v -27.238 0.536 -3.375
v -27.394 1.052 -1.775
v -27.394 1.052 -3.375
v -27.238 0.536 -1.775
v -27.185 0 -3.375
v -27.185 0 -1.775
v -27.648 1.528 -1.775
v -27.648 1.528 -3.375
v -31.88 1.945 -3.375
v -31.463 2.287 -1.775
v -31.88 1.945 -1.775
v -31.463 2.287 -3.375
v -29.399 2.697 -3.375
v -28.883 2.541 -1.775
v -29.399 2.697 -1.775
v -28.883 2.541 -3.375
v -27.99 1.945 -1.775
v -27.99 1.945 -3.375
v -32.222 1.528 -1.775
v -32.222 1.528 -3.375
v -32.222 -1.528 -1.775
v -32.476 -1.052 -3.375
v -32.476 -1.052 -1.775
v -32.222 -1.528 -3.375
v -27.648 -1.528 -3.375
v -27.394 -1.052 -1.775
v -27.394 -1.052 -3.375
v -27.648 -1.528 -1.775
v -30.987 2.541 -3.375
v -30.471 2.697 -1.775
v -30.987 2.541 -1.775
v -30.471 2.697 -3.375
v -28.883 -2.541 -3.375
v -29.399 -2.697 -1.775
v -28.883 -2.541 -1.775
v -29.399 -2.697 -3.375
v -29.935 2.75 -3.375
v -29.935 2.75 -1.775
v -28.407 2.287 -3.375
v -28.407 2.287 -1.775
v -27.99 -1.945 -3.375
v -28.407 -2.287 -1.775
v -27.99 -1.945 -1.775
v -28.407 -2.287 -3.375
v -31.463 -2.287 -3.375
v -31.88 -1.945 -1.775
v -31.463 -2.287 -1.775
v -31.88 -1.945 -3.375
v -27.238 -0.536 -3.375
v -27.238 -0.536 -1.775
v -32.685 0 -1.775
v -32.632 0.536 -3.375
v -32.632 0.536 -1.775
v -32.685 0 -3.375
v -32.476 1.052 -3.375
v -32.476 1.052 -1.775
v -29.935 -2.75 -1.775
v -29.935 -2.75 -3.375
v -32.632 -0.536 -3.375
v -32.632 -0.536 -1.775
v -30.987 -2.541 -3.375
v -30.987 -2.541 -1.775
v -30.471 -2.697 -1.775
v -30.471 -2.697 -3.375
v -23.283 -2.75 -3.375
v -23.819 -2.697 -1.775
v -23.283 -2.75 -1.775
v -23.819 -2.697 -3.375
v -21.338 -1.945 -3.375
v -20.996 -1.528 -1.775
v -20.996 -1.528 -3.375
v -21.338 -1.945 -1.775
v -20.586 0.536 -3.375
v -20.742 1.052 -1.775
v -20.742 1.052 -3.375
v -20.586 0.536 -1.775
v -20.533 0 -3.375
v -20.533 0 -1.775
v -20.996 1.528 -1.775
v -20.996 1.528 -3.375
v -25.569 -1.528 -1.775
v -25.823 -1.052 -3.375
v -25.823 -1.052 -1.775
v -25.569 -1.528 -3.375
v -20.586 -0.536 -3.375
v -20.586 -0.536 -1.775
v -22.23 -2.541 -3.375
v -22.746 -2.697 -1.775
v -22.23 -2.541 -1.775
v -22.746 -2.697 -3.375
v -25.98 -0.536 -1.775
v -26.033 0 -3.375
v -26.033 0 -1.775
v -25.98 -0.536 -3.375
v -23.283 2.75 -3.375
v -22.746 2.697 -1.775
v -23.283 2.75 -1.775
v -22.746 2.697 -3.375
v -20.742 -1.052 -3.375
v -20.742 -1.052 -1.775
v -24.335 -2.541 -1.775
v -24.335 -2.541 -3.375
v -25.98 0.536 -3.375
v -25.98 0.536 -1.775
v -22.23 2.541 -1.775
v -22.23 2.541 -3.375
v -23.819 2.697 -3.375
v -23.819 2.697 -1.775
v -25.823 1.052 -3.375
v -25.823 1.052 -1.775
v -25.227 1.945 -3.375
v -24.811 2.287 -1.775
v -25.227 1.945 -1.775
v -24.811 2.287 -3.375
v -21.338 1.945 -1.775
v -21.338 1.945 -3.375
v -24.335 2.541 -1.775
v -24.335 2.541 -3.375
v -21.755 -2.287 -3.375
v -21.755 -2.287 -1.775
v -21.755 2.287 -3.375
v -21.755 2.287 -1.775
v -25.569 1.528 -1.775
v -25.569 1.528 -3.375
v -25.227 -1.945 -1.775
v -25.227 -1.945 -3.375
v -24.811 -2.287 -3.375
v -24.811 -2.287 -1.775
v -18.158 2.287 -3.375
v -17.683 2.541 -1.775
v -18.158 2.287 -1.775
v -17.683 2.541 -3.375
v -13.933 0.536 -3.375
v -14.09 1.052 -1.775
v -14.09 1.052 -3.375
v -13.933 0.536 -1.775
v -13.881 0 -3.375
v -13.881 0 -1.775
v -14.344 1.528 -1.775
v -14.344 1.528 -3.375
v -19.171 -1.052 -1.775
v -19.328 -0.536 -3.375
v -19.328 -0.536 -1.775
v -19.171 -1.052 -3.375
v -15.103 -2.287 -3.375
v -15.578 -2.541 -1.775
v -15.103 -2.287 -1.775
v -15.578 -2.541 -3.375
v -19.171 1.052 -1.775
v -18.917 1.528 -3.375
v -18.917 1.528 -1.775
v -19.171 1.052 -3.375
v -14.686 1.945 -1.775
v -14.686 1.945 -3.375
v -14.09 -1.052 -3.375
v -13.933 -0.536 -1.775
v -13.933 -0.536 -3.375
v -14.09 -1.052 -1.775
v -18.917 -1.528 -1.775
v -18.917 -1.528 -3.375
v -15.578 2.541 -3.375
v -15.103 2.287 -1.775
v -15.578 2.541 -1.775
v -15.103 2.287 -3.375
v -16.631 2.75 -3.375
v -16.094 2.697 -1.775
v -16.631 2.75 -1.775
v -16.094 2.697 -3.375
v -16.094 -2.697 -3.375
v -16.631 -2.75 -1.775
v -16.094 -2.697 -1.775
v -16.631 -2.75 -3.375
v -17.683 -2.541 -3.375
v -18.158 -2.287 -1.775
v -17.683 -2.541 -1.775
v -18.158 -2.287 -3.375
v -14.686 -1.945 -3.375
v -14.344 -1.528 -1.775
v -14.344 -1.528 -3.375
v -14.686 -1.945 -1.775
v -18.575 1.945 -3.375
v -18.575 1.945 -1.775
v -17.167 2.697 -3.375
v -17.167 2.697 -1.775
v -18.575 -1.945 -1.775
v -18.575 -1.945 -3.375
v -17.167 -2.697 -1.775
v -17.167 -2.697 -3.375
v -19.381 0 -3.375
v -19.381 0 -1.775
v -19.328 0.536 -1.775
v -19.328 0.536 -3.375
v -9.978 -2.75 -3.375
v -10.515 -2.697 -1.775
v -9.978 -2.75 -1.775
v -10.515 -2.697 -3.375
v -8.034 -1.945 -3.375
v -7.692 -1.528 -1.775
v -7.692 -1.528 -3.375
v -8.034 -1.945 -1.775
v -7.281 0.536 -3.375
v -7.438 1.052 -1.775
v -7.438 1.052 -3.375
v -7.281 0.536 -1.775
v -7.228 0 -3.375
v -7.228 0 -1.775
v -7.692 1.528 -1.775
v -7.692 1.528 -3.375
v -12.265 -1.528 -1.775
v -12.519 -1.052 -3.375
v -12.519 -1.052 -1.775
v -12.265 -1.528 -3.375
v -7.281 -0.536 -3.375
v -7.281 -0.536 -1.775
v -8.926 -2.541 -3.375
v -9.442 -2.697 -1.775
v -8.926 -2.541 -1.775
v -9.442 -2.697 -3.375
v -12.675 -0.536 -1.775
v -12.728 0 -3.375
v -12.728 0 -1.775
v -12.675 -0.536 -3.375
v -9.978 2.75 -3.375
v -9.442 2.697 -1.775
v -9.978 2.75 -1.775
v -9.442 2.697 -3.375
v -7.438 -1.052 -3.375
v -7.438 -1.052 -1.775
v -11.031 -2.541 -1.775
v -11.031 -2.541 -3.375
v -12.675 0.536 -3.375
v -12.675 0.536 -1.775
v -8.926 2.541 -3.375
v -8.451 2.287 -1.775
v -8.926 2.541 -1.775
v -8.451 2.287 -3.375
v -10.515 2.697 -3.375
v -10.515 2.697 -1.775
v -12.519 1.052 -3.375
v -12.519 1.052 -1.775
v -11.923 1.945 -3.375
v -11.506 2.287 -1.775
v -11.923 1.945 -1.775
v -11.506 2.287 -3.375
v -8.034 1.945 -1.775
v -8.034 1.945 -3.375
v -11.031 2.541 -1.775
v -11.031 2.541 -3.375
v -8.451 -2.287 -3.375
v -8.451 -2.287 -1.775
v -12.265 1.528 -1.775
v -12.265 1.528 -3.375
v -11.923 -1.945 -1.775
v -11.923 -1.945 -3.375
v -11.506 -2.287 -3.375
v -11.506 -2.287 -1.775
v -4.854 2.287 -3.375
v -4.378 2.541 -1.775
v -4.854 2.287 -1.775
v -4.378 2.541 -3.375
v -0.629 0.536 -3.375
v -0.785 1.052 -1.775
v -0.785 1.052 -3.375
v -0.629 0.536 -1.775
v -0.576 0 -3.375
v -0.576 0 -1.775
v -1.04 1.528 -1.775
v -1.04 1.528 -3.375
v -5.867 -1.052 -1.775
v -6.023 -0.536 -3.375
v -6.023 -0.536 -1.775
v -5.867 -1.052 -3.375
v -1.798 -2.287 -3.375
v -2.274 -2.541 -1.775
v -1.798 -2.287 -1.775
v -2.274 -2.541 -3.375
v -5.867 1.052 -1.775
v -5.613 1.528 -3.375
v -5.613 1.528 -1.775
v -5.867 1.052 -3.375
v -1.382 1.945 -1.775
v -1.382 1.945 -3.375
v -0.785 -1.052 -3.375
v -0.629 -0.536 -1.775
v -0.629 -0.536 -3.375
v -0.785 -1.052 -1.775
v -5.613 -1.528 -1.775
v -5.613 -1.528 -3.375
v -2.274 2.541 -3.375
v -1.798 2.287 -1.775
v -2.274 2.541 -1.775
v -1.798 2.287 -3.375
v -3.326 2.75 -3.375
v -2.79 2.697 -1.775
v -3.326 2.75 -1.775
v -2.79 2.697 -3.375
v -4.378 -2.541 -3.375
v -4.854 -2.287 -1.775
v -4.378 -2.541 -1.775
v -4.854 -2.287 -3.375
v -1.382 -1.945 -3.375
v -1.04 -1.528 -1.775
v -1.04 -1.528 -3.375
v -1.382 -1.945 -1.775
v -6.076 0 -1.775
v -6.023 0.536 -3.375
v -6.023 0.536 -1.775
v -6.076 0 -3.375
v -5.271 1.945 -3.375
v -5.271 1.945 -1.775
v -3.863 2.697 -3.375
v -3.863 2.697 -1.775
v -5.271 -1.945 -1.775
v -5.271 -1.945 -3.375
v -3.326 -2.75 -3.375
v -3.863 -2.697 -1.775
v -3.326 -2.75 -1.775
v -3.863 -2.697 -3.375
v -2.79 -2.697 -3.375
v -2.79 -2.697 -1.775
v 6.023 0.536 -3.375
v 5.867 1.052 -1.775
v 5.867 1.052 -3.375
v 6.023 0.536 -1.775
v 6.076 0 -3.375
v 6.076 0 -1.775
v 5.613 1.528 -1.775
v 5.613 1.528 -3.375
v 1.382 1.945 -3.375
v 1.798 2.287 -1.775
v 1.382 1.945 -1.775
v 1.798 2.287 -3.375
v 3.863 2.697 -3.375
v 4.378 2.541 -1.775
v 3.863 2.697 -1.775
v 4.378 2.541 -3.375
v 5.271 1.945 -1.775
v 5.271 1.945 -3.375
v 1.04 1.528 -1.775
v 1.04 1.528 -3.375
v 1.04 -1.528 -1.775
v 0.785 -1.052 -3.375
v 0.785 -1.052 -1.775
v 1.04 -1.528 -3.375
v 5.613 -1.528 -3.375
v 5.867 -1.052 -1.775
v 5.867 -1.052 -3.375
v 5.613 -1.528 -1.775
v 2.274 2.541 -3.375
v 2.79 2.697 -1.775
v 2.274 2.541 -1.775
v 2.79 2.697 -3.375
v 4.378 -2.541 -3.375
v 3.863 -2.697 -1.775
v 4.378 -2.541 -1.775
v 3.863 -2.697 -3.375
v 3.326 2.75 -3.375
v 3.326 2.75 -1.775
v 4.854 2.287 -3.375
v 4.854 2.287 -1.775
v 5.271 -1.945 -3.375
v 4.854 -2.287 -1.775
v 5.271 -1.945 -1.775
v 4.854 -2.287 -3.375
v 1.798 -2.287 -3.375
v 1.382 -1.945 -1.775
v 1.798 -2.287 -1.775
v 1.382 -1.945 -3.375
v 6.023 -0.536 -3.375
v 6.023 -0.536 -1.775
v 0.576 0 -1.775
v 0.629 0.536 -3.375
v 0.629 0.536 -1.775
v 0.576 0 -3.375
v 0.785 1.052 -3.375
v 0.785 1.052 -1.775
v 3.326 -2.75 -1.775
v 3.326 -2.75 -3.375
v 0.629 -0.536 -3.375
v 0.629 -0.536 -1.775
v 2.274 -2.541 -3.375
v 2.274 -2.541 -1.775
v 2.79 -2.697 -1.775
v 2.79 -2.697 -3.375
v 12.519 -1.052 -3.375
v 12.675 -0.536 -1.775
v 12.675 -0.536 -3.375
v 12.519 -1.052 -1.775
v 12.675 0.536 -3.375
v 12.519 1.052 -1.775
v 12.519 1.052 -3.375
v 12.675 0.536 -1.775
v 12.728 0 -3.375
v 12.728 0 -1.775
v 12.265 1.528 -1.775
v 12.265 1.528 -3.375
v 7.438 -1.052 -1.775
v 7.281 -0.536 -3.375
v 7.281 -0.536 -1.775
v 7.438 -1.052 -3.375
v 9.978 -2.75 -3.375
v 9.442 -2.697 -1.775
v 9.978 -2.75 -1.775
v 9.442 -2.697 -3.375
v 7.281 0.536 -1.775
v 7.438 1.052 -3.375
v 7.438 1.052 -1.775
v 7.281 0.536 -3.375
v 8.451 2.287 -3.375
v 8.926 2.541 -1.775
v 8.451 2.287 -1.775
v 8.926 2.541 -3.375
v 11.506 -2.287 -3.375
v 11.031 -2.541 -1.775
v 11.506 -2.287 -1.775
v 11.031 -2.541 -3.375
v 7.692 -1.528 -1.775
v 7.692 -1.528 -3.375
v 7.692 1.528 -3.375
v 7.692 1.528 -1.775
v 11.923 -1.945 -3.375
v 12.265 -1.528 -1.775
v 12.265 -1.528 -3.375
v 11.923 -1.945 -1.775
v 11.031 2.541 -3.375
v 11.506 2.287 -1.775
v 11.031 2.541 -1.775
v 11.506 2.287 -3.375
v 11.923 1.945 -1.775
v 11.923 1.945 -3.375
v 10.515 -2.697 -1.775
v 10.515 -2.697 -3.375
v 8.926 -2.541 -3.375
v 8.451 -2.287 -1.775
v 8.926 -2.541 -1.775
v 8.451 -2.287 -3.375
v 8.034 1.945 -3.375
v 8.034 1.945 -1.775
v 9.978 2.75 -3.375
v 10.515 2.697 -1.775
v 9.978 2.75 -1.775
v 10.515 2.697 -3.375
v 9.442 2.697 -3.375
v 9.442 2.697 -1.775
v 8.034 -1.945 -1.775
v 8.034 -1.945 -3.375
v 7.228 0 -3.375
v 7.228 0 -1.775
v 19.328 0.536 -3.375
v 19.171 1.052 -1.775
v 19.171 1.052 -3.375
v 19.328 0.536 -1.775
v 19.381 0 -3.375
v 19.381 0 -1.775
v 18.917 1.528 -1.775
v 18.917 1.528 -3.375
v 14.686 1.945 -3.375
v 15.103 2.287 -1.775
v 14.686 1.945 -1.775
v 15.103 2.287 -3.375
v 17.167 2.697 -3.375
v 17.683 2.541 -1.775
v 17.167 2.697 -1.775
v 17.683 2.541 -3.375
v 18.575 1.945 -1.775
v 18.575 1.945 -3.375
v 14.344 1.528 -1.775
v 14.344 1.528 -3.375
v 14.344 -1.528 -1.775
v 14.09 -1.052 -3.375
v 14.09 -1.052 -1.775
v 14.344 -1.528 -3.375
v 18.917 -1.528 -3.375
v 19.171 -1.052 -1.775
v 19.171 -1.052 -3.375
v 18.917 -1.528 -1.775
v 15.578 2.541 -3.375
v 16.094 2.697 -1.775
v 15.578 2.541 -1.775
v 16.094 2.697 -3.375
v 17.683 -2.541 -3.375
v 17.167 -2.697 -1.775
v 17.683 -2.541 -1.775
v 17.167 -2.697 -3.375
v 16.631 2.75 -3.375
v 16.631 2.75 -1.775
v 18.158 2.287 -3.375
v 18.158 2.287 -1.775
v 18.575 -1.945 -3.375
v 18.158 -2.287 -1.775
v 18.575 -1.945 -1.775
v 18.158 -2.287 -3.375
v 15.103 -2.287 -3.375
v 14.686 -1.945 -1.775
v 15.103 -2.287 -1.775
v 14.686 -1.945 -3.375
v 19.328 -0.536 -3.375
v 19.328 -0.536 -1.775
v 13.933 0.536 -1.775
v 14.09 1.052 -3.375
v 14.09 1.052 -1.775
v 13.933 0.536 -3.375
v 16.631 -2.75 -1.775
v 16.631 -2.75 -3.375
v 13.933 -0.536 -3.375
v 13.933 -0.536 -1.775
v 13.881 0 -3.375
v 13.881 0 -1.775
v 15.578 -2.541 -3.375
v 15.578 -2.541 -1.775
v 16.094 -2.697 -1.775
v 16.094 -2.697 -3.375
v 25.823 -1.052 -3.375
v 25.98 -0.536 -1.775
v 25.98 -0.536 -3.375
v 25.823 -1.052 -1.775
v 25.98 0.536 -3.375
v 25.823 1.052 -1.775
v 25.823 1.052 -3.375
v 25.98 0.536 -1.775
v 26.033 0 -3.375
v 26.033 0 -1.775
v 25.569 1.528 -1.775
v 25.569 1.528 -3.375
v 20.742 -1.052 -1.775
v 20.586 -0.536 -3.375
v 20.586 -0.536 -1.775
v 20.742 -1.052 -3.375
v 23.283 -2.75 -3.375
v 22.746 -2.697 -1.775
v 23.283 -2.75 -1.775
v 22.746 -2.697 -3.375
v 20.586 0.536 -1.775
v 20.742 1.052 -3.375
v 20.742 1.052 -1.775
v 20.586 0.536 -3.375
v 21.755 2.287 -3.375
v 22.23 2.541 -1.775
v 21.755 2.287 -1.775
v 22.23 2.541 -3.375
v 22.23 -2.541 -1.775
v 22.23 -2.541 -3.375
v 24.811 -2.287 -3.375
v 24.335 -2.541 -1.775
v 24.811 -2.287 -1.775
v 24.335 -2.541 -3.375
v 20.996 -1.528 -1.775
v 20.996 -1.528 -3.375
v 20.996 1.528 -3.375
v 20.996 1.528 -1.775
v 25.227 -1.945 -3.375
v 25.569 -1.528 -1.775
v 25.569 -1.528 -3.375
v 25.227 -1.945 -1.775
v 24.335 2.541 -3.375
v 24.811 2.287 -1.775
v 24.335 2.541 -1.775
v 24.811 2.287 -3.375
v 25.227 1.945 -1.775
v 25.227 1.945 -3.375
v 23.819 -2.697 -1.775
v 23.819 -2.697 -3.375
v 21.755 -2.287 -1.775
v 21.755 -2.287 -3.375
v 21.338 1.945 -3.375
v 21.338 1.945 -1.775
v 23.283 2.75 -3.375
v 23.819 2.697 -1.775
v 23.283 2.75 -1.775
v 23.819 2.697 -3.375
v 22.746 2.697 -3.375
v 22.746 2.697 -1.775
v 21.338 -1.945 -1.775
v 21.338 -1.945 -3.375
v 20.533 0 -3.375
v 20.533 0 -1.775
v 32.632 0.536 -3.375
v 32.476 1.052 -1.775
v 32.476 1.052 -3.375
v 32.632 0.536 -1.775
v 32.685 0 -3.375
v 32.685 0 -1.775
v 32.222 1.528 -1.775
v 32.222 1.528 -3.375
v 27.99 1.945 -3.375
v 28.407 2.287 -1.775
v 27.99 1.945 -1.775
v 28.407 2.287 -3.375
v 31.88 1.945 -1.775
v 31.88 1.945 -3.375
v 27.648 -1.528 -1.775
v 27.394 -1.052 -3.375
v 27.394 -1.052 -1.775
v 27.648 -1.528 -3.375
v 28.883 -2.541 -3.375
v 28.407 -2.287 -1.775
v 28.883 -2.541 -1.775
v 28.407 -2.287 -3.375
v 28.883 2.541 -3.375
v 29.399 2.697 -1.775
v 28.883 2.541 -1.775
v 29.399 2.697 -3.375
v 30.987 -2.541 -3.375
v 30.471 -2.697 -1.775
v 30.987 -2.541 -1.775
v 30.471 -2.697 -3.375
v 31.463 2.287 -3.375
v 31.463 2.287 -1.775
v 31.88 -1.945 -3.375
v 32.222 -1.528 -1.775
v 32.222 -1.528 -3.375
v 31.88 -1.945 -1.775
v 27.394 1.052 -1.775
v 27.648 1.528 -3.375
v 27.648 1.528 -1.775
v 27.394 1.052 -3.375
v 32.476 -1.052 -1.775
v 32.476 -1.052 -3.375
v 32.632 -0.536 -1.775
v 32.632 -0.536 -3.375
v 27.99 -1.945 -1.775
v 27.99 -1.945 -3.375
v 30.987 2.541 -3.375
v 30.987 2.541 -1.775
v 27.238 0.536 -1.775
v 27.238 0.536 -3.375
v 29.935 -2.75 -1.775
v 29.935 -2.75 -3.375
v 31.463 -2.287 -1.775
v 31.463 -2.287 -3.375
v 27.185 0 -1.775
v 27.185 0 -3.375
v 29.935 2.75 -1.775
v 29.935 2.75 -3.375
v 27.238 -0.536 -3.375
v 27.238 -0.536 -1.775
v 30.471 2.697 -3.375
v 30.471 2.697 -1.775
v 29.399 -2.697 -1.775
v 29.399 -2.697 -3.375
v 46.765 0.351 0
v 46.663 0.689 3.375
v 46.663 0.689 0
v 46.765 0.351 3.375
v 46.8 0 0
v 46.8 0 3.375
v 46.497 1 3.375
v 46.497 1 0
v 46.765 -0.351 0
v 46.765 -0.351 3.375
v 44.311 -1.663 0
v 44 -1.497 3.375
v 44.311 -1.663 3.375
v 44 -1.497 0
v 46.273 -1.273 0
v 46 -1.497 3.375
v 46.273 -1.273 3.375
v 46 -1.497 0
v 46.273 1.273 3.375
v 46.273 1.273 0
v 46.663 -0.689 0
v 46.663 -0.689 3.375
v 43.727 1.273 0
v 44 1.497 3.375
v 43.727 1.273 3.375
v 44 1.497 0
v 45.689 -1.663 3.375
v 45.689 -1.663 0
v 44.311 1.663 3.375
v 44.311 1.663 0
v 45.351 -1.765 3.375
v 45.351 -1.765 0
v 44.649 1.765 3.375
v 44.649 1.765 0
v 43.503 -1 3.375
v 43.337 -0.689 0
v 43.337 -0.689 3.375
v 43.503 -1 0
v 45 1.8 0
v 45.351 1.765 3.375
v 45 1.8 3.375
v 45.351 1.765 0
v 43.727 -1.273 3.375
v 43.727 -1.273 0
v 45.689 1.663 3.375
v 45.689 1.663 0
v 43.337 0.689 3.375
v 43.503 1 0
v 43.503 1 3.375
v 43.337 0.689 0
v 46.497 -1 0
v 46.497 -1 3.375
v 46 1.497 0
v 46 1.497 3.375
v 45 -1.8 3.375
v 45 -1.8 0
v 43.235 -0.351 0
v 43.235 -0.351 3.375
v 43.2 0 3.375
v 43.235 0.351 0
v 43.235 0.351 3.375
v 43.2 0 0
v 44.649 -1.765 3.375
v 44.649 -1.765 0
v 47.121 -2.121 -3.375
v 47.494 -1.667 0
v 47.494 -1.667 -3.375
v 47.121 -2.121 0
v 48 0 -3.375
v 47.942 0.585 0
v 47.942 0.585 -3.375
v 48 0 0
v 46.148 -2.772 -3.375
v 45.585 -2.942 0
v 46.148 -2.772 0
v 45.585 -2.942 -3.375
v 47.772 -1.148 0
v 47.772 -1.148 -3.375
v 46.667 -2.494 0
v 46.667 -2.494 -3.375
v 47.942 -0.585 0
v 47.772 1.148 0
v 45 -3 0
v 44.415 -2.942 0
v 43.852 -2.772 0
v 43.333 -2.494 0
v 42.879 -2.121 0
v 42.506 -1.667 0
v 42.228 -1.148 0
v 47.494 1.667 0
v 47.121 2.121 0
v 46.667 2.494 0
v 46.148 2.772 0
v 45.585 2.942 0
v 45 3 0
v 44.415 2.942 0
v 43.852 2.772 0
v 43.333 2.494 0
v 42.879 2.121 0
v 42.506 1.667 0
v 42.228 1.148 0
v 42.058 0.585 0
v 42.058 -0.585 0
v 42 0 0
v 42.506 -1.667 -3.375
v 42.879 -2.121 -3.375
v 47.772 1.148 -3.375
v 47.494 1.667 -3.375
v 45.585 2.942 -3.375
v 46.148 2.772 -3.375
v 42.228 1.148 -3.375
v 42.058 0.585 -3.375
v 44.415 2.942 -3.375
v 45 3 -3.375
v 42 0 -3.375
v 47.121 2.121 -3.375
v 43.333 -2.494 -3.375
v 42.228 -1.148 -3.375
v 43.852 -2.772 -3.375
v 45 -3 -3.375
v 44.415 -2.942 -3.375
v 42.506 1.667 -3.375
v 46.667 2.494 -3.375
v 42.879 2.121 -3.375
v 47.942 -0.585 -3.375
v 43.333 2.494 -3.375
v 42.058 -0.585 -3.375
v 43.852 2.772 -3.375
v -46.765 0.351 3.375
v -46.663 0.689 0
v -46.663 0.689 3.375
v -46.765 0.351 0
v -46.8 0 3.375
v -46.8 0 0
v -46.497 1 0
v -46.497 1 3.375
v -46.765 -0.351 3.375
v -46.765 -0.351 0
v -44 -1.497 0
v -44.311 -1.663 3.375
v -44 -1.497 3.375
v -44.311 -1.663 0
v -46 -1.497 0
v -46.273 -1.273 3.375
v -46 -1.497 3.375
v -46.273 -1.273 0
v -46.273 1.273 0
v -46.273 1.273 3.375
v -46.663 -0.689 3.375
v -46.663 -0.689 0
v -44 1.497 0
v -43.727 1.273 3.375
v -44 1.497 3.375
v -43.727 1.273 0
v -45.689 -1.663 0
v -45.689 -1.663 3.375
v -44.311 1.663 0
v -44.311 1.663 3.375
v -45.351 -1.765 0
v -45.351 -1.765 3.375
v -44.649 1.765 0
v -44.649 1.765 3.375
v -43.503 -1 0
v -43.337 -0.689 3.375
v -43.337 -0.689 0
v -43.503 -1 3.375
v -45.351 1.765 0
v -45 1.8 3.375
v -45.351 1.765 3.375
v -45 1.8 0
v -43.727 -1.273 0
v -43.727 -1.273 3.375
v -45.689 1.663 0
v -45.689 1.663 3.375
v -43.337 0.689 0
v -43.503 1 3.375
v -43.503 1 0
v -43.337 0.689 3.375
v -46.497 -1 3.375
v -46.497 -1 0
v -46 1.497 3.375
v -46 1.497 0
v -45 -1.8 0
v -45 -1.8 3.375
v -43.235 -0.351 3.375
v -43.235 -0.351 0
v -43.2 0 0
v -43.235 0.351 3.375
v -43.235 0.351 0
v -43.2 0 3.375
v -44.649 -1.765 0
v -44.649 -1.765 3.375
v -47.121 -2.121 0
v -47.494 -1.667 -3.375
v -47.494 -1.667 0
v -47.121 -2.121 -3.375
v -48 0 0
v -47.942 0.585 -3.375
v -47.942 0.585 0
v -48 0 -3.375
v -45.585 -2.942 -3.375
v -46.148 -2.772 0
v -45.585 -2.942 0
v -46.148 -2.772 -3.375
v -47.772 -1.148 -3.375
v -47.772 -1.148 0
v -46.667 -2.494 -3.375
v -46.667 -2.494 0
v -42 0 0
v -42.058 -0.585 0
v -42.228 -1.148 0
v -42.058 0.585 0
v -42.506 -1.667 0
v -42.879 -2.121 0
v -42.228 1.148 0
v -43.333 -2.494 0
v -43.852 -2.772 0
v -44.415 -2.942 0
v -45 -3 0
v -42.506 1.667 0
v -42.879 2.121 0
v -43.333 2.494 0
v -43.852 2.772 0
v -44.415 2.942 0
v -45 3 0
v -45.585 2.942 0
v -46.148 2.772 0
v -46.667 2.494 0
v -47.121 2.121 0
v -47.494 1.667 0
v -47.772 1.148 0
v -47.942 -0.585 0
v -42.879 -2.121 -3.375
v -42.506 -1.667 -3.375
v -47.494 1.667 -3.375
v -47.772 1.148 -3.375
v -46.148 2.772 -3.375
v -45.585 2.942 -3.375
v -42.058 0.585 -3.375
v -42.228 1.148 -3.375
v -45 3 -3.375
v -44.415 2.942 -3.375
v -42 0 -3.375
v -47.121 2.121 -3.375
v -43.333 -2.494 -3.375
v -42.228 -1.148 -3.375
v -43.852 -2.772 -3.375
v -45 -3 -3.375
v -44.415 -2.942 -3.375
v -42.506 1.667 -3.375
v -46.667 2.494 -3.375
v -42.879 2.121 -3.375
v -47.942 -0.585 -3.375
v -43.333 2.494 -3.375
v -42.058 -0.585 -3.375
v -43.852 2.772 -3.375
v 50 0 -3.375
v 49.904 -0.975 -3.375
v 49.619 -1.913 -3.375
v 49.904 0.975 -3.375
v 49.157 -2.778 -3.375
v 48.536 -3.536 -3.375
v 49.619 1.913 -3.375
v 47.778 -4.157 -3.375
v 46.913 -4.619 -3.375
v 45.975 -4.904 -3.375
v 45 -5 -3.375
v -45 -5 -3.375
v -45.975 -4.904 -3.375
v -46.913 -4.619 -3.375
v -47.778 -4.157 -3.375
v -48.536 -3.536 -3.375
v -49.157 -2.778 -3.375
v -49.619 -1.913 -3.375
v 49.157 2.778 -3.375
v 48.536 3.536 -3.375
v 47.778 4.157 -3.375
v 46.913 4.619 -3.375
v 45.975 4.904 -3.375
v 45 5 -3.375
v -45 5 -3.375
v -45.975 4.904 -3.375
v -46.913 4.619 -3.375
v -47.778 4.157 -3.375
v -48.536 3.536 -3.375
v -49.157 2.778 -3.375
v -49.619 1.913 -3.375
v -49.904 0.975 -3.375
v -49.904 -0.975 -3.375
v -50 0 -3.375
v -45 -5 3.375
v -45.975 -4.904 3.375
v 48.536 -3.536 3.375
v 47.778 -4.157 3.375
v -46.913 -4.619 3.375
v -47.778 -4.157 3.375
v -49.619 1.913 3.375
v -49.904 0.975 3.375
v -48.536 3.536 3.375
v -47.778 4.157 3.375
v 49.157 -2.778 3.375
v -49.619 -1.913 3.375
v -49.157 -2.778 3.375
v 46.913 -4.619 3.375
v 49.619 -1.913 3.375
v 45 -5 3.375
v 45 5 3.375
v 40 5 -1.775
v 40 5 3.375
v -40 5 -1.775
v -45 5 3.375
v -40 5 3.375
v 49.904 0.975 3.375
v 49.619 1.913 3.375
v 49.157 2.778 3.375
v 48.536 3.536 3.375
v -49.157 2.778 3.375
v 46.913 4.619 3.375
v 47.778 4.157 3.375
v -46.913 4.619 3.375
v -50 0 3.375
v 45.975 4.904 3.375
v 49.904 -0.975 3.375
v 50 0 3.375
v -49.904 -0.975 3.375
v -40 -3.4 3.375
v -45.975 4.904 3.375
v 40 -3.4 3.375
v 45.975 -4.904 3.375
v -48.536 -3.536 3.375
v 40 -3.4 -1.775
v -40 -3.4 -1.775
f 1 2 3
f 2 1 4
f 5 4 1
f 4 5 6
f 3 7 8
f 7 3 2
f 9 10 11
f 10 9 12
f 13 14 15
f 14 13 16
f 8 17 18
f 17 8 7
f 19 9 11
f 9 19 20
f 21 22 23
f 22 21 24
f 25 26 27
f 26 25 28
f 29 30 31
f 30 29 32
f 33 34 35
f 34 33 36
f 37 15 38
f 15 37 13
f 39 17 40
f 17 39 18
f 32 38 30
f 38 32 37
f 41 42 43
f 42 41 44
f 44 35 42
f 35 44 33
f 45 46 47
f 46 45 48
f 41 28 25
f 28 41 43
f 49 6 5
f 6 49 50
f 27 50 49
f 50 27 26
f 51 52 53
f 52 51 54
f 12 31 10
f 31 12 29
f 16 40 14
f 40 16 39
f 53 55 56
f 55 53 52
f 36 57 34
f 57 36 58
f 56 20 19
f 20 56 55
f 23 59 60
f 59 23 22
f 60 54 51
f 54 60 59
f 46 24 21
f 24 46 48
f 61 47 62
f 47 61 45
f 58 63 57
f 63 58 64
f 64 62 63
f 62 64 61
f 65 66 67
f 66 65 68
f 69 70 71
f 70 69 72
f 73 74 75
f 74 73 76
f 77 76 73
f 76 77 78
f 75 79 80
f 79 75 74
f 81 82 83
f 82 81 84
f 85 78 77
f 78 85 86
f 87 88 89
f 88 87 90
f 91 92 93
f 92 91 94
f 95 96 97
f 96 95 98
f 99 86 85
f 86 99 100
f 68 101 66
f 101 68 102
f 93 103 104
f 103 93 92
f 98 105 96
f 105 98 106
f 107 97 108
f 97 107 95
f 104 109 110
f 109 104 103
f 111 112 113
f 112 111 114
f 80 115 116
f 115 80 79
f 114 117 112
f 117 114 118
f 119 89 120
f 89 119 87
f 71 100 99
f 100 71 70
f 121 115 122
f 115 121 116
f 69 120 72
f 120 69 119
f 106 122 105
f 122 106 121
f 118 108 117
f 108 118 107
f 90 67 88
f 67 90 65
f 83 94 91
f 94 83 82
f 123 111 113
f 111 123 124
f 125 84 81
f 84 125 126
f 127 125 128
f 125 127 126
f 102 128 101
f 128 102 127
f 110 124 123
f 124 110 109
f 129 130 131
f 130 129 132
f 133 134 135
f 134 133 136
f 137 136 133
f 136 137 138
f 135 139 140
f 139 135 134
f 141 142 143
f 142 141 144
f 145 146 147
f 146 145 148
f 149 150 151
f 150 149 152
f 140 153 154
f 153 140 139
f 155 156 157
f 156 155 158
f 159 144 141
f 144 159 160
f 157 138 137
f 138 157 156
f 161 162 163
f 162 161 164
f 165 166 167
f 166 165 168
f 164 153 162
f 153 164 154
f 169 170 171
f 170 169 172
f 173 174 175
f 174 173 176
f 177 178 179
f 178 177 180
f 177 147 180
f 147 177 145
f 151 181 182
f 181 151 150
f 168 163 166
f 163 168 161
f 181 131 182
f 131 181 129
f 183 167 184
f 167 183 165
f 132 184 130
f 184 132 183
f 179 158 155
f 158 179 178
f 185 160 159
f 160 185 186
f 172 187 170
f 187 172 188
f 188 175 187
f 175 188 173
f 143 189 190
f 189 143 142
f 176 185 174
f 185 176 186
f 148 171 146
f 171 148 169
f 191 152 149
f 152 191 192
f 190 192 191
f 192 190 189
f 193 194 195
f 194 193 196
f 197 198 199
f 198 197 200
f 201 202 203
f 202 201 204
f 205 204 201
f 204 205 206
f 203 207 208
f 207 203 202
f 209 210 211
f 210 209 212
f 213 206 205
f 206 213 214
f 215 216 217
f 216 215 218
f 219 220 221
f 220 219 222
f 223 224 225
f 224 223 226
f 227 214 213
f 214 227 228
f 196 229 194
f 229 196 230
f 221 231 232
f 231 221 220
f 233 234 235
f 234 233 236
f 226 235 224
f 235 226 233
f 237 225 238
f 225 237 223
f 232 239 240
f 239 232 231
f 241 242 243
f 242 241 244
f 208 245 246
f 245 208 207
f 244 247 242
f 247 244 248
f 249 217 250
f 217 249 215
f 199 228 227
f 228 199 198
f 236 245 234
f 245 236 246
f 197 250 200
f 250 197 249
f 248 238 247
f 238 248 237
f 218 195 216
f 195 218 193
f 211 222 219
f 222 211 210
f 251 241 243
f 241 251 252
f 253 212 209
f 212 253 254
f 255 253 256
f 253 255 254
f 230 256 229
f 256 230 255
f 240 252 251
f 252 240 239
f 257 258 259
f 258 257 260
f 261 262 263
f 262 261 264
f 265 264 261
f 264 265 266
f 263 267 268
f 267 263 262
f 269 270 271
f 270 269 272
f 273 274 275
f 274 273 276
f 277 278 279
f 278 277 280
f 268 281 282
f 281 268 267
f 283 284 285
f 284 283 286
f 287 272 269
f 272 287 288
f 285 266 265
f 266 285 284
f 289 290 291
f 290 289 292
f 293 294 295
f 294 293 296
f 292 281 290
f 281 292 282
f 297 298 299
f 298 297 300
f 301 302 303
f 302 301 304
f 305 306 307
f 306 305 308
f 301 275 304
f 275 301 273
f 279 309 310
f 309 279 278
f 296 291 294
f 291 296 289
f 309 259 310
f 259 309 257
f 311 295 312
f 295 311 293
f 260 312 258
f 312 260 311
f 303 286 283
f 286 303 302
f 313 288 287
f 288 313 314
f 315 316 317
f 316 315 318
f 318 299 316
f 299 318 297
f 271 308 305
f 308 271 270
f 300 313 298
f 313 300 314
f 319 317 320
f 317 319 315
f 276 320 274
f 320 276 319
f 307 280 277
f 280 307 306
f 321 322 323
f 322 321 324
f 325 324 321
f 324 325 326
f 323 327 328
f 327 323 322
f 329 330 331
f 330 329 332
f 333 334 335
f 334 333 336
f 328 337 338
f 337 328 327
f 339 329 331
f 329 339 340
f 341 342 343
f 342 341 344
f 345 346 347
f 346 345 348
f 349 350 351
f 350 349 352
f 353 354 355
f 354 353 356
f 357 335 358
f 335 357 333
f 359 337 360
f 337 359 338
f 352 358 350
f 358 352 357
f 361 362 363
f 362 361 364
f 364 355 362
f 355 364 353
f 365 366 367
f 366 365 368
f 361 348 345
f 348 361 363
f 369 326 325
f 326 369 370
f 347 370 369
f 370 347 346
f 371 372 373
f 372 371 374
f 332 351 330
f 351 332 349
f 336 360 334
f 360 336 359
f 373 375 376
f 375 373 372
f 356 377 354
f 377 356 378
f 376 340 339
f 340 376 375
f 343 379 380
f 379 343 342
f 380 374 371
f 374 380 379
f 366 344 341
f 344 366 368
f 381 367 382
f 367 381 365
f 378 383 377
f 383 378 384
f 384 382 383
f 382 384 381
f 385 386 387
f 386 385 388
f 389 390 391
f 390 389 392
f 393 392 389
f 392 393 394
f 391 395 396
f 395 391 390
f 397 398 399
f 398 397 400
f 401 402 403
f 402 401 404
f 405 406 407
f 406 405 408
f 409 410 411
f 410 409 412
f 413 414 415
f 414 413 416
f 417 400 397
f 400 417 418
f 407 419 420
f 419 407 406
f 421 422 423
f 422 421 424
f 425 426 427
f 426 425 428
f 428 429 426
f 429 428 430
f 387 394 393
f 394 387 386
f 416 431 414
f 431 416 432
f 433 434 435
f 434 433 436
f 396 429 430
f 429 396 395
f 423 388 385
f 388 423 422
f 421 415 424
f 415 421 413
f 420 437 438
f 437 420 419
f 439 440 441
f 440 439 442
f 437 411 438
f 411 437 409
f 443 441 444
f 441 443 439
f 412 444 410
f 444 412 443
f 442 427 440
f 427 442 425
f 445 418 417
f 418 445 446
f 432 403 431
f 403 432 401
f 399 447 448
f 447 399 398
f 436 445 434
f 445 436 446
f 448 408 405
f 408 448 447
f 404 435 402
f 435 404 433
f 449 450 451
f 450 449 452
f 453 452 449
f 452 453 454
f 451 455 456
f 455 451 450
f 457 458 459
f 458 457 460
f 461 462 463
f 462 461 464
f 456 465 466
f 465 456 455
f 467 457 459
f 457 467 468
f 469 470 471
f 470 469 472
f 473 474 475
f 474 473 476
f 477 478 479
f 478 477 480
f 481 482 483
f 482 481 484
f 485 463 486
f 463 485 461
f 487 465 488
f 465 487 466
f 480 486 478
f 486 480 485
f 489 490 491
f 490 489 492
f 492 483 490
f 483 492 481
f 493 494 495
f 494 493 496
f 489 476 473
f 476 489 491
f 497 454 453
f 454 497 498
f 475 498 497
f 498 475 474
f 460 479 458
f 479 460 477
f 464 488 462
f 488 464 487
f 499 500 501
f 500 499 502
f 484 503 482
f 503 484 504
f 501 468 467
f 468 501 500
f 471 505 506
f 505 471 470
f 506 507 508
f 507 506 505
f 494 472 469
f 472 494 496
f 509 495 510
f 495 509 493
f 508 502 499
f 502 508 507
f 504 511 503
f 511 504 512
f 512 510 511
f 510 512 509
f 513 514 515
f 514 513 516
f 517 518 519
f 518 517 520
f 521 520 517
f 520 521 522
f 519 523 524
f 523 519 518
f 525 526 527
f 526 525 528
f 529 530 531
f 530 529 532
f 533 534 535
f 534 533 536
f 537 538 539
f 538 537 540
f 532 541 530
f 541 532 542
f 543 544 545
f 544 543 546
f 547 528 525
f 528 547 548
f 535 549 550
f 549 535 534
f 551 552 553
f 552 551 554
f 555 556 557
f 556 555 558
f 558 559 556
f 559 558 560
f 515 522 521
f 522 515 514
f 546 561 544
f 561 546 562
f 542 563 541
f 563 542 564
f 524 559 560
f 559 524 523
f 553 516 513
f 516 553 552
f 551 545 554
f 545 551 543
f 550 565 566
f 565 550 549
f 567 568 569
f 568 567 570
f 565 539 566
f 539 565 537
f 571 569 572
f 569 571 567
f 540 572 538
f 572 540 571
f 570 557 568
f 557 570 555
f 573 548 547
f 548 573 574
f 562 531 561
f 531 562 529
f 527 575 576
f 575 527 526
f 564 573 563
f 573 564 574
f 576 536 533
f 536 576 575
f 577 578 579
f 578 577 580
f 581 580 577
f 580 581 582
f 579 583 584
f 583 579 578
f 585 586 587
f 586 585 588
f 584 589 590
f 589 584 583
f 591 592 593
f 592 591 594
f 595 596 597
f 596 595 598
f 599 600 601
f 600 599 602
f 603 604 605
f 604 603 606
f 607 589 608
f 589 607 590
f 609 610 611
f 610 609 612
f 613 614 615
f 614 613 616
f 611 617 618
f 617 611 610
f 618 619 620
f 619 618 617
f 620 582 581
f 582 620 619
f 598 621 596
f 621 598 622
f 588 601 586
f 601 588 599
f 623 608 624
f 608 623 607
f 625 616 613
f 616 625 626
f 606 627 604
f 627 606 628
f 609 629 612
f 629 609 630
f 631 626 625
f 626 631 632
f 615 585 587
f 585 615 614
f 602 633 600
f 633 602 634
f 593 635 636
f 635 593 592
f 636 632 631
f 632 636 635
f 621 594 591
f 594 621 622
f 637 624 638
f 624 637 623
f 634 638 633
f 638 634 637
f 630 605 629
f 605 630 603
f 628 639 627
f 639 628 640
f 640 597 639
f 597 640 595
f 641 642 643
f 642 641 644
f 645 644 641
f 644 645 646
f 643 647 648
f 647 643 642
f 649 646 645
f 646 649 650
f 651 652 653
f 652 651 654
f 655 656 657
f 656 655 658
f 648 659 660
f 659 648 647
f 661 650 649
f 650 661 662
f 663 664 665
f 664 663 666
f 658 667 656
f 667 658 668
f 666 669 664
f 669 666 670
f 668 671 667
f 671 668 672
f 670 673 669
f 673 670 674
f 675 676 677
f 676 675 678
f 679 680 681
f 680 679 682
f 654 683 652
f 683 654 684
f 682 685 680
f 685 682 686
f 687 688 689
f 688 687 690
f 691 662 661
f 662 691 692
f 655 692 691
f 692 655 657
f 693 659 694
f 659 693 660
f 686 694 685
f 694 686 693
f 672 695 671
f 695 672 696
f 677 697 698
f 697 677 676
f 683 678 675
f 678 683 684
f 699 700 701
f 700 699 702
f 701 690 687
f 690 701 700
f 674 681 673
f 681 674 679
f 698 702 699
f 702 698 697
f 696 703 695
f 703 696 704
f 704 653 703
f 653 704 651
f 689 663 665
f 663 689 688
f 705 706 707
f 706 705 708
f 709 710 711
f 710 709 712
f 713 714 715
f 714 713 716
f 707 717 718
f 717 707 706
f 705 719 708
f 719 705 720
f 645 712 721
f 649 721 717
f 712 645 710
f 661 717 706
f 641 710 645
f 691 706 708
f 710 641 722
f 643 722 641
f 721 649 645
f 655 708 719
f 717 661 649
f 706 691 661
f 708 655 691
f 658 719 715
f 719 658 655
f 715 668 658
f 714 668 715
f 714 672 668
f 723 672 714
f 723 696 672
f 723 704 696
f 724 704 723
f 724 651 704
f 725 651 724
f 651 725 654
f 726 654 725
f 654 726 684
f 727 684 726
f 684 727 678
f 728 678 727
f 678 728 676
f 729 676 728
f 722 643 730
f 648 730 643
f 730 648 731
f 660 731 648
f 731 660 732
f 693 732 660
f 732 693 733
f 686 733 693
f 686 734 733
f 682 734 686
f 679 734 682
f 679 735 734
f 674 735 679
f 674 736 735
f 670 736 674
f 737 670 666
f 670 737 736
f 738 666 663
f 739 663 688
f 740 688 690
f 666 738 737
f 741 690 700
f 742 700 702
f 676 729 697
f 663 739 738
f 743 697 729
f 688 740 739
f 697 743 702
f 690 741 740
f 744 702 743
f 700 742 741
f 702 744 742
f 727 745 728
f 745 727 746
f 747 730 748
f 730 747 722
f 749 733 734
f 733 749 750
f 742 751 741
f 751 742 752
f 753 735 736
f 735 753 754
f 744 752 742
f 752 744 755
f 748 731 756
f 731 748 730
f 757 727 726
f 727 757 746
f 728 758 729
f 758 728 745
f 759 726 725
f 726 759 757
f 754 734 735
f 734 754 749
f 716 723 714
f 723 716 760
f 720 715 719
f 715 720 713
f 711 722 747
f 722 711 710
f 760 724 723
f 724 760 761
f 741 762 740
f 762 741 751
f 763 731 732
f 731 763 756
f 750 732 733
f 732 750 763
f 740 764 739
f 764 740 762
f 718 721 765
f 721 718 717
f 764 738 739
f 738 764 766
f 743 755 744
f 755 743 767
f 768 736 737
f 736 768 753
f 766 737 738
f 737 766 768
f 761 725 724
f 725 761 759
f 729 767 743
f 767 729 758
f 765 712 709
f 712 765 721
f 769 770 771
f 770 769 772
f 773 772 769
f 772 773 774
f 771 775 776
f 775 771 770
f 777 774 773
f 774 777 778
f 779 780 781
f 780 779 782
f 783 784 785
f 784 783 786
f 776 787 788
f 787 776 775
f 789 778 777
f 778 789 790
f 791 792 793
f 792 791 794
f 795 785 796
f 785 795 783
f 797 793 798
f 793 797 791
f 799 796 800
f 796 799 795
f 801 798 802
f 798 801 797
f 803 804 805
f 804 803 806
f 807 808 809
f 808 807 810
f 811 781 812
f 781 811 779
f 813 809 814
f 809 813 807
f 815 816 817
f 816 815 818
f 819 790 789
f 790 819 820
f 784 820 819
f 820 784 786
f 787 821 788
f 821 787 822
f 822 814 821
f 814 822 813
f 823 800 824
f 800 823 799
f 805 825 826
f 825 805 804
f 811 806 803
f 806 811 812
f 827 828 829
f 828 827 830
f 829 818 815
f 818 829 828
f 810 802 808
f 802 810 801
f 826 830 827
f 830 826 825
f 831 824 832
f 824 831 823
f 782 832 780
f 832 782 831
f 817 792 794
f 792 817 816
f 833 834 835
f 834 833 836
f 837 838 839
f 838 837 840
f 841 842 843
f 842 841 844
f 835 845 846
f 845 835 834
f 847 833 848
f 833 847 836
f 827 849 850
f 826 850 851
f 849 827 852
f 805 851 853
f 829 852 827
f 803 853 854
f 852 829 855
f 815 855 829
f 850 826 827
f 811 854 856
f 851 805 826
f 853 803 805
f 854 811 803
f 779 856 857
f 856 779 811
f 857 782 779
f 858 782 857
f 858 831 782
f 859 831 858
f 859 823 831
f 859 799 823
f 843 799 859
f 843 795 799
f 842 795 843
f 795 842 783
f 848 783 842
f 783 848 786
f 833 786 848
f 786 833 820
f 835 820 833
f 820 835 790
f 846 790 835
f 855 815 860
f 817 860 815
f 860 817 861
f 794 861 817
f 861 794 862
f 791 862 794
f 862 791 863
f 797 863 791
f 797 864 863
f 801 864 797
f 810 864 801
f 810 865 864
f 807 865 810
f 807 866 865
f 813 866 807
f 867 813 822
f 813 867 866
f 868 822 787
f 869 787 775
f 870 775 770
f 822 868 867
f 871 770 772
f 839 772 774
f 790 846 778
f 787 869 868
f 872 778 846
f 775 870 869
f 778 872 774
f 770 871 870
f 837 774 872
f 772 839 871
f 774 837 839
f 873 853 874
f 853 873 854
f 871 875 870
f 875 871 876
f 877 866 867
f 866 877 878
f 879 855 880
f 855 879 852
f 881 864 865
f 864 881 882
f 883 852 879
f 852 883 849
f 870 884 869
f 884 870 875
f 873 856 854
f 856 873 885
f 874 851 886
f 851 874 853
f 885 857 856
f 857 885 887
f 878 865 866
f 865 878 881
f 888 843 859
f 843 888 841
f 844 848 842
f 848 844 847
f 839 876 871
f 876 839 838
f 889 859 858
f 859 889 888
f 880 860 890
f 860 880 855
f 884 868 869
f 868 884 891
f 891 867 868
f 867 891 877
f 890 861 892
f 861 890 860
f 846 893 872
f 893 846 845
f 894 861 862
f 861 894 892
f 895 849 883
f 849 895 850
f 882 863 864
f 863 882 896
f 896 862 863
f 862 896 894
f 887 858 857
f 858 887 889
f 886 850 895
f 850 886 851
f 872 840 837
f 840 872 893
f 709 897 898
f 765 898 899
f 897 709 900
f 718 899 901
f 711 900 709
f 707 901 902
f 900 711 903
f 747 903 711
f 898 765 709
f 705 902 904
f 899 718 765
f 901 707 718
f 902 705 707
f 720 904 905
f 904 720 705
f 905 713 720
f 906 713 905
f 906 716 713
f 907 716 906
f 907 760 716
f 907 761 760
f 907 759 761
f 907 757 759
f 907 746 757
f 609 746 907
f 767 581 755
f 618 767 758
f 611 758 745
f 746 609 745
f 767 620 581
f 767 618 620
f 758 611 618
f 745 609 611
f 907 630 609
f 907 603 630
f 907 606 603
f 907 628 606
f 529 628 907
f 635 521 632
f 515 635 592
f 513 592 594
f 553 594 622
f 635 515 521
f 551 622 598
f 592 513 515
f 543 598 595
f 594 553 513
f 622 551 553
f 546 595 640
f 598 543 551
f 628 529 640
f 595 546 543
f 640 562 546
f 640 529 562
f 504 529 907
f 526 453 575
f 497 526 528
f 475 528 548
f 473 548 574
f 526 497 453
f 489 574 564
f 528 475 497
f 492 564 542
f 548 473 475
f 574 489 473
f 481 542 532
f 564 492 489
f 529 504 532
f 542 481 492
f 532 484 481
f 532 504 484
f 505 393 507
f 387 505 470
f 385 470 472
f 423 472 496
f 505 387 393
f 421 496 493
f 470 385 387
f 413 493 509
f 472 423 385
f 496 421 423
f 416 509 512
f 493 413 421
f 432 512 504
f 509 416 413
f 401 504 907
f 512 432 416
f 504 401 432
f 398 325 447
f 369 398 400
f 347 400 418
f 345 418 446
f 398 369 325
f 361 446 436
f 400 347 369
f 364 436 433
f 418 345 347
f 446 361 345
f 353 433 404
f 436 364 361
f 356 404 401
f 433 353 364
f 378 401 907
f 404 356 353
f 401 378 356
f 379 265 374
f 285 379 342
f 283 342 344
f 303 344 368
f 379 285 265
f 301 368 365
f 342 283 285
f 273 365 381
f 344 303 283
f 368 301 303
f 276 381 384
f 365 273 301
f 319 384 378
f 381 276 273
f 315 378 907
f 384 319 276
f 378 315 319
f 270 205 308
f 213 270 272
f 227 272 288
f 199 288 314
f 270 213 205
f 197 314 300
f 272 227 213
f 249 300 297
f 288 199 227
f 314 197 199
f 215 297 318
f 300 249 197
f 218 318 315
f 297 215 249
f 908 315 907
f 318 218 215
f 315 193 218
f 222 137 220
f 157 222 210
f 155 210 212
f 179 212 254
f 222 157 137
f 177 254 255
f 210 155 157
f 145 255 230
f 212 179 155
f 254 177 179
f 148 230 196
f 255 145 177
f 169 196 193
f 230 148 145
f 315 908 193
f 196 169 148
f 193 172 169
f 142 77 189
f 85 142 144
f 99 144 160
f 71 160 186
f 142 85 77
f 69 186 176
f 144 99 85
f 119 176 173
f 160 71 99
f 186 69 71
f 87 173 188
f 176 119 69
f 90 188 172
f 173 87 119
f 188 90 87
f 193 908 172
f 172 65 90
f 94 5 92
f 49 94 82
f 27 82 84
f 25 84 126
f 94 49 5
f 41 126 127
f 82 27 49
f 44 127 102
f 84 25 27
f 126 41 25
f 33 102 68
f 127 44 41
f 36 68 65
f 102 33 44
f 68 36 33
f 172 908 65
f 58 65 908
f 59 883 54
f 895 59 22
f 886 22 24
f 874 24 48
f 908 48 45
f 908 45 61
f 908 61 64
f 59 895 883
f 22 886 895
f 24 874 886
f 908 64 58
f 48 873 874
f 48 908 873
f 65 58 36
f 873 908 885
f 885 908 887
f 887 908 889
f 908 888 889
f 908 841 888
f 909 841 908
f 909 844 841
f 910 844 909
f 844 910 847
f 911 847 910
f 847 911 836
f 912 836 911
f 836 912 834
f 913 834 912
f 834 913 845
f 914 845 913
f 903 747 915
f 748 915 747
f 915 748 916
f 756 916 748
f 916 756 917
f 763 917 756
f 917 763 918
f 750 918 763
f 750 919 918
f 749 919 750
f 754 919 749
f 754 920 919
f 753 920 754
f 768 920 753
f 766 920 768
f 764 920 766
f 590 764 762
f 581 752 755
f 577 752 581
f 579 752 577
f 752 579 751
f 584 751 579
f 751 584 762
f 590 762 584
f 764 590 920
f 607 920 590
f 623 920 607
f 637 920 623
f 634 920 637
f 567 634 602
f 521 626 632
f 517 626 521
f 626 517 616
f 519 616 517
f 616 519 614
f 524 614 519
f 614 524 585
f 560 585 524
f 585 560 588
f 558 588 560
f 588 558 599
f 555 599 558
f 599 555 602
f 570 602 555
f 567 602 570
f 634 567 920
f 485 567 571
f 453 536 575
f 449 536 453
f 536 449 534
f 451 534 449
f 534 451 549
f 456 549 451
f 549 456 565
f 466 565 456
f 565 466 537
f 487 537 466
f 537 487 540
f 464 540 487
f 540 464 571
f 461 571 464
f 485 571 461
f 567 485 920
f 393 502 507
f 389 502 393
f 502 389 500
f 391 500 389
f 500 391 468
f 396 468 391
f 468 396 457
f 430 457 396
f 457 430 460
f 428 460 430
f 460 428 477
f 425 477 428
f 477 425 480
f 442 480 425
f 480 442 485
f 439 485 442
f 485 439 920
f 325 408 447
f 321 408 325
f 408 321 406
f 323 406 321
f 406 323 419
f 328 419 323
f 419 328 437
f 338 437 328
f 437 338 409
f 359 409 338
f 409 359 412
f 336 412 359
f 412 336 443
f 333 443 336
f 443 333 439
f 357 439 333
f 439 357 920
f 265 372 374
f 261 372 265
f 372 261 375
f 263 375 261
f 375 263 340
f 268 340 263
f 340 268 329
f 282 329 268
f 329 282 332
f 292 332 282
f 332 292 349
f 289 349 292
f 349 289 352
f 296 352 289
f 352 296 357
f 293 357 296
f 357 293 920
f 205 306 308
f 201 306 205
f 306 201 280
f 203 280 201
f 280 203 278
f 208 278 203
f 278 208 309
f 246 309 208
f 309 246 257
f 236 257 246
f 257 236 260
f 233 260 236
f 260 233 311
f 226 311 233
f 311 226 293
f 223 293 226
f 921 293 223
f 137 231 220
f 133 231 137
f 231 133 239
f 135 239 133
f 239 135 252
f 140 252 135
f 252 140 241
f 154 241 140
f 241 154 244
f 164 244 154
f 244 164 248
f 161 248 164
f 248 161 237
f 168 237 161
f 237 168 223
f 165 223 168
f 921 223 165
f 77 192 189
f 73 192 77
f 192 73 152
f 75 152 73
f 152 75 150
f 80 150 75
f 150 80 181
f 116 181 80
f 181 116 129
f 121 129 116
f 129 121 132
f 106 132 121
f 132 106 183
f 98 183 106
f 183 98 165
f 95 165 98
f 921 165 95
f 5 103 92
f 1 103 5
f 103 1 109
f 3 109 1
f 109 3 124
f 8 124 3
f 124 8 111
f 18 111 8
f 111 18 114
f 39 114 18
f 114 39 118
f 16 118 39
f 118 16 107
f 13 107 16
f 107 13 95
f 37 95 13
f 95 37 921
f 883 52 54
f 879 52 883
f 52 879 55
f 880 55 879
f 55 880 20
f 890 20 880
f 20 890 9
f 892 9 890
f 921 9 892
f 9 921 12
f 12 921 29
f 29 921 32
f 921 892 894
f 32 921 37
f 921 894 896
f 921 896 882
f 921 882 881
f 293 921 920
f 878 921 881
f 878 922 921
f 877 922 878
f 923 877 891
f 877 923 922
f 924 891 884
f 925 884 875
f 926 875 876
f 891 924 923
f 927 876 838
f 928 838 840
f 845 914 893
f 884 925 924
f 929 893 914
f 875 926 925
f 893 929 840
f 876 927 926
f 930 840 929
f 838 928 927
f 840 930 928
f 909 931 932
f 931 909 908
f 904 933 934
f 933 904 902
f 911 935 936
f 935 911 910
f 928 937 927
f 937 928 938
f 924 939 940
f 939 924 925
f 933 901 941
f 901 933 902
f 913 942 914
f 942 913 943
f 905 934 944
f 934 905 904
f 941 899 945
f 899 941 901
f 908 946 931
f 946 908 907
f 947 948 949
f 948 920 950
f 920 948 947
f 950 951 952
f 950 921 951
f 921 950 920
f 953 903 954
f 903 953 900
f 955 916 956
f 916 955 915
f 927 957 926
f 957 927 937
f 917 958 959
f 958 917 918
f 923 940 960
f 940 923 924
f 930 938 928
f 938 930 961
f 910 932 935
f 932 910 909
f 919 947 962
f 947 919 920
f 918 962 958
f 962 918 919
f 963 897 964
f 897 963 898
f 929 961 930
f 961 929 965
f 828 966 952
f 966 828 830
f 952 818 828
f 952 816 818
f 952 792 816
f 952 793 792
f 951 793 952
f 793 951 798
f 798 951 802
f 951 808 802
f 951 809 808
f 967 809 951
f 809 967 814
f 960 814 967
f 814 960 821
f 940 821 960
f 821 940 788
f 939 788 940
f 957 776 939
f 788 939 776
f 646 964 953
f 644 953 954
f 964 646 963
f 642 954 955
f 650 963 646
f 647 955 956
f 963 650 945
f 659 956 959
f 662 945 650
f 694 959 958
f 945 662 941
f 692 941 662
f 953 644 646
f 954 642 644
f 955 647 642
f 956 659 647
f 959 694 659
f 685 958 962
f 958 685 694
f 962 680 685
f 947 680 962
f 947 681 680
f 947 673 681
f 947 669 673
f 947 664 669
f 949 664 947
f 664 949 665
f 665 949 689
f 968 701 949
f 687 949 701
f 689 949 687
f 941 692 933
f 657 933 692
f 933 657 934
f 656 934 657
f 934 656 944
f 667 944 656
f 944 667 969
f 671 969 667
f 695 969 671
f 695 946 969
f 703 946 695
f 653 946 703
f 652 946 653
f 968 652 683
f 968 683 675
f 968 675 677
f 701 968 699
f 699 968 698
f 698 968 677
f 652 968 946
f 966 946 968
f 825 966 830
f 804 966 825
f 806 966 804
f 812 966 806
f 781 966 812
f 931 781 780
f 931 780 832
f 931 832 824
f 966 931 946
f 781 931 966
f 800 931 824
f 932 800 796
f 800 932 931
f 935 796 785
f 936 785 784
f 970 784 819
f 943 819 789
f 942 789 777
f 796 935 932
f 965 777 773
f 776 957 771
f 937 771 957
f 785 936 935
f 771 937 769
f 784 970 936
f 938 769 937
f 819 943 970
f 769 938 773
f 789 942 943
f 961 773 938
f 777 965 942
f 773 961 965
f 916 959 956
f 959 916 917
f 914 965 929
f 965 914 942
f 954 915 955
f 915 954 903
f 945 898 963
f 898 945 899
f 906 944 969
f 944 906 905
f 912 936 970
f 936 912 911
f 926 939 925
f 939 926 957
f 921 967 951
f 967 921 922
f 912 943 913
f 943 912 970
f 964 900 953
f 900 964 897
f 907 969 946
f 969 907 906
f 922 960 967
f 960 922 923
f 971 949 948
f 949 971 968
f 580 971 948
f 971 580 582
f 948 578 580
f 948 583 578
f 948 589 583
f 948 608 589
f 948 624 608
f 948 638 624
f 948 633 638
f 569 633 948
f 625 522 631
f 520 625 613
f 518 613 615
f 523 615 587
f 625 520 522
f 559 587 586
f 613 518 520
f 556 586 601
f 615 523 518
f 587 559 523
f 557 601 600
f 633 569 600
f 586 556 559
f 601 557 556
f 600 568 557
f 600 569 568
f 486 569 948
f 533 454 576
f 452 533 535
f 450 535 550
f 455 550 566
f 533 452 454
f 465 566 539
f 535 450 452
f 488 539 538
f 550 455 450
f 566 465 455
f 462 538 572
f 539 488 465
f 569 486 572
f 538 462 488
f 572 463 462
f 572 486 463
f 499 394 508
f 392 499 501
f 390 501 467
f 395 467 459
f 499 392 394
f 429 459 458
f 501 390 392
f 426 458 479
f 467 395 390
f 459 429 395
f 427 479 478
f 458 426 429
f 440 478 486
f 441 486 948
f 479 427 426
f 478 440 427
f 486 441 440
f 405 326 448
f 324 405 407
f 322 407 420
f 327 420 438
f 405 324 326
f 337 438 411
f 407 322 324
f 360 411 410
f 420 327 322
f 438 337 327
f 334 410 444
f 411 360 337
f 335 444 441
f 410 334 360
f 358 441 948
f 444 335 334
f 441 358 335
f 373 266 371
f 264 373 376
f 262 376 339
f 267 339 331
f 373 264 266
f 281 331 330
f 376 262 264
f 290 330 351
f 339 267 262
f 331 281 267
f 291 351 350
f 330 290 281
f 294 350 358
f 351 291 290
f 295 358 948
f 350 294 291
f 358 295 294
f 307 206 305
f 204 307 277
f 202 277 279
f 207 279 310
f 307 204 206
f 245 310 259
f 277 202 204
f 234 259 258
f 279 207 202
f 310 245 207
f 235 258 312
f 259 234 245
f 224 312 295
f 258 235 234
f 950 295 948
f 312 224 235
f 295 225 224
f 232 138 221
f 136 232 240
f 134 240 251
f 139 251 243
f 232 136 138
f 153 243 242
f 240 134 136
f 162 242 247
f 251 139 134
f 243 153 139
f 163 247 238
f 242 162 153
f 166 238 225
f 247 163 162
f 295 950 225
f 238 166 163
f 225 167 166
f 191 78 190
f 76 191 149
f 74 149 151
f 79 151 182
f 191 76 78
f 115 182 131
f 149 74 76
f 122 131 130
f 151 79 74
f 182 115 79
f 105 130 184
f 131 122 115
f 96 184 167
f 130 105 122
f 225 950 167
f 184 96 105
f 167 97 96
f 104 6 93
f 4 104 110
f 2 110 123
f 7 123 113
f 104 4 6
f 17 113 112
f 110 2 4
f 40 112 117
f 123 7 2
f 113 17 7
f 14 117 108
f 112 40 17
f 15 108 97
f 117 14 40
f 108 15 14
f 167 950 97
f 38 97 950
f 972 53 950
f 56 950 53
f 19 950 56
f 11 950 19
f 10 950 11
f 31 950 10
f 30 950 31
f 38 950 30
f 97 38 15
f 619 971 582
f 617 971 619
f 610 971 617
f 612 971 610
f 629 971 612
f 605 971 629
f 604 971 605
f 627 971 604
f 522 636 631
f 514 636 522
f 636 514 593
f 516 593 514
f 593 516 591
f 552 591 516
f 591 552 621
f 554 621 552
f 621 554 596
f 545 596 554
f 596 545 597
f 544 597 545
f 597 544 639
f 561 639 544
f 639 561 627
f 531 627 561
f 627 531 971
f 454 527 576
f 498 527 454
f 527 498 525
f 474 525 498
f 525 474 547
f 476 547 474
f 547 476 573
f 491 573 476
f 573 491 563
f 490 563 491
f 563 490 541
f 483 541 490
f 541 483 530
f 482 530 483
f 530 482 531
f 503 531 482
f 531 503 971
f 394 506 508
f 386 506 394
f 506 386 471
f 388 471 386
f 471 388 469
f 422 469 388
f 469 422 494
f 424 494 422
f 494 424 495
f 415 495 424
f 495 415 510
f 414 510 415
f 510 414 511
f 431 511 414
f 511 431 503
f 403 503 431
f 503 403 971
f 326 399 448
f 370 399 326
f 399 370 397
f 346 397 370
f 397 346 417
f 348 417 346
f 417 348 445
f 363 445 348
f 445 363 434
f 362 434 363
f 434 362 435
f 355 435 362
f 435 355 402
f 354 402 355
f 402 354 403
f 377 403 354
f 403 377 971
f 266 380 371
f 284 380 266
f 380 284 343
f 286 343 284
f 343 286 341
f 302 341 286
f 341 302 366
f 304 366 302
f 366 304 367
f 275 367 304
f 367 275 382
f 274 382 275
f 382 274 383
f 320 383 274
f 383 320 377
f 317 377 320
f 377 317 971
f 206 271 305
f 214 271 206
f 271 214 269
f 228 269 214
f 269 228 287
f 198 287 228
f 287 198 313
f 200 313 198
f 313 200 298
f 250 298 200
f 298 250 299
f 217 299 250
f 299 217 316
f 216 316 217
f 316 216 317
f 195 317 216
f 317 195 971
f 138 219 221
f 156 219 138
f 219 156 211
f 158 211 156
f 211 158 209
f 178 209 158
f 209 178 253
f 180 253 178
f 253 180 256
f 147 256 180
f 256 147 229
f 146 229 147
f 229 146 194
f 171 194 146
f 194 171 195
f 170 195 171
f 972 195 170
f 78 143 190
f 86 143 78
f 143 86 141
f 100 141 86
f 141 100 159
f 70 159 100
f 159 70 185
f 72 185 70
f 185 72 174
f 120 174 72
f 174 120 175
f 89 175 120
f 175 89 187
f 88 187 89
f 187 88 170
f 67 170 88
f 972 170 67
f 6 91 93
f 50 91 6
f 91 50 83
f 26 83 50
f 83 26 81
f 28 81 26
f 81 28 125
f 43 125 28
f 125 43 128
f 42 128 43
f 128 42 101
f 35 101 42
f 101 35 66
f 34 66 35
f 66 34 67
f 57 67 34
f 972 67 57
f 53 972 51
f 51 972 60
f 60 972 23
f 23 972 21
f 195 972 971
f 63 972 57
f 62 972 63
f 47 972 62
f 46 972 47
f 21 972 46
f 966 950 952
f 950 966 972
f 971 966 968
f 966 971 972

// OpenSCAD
// file: syms.scad
module symY(t) {
    translate(t)
        children();
    mirror([0,1,0])
        translate(t)
            children();
}
module symX(t) {
    translate(t)
        children();
    mirror([1,0,0])
        translate(t)
            children();
}

module symZ(t) {
    translate(t)
        children();
    mirror([0,0,1])
        translate(t)
            children();
}

module	symXY(t) {
	tx=t[0];
	ty=t[1];
	tz=t[2];
	symX([tx,0,0])
	symY([0,ty,tz])
		children();
}

module magnetCut(D,S) {
    cylinder(d=D,h=10);
    for(d=[45,-45])
    rotate(d)
    cube([2*D,S,30],center=true);
}


// calculates the radius from "segment" paramers:
// https://en.wikipedia.org/wiki/Circular_segment
function    circleSlice2radius2(c,h) = (c*c/8/h)+ h/2;

function toInt(str) = 
    let(d = [for (s = str) ord(s) - 48], l = len(d) - 1)
    [for (i = 0, a = d[i];i <= l;i = i + 1, a = 10 * a + d[i]) a][l];
        
// main file
use <syms.scad>
W=1.6;

$fn=32;

L=80;
K=10;

S=65.37;   
D=5.5; // led dia
Z=4.65+.5;

E=K;

mode="def";

module gen() {
    difference() {
        
        hull() {
            symX([L/2+K/2,0,0])
            cylinder(d=K,h=Z+W,center=true);
        }
        
        translate([0,W,W])
        cube([L,K,(Z+W)],center=true);
        
        N=10;
        A=S-D;
        for(i=[0:N-1]) {
            translate([(i-(N-1)/2)*A/(N-1),0,0])
                cylinder(d=D,center=true,h=K);
        }

        symX([L/2+K/2,0,0]) {
            cylinder(d=3.6,center=true,h=K);
            mirror([0,0,1])
            cylinder(d=6,h=K);
        }
        
    }

}

if(mode=="def") {

    gen();
}
